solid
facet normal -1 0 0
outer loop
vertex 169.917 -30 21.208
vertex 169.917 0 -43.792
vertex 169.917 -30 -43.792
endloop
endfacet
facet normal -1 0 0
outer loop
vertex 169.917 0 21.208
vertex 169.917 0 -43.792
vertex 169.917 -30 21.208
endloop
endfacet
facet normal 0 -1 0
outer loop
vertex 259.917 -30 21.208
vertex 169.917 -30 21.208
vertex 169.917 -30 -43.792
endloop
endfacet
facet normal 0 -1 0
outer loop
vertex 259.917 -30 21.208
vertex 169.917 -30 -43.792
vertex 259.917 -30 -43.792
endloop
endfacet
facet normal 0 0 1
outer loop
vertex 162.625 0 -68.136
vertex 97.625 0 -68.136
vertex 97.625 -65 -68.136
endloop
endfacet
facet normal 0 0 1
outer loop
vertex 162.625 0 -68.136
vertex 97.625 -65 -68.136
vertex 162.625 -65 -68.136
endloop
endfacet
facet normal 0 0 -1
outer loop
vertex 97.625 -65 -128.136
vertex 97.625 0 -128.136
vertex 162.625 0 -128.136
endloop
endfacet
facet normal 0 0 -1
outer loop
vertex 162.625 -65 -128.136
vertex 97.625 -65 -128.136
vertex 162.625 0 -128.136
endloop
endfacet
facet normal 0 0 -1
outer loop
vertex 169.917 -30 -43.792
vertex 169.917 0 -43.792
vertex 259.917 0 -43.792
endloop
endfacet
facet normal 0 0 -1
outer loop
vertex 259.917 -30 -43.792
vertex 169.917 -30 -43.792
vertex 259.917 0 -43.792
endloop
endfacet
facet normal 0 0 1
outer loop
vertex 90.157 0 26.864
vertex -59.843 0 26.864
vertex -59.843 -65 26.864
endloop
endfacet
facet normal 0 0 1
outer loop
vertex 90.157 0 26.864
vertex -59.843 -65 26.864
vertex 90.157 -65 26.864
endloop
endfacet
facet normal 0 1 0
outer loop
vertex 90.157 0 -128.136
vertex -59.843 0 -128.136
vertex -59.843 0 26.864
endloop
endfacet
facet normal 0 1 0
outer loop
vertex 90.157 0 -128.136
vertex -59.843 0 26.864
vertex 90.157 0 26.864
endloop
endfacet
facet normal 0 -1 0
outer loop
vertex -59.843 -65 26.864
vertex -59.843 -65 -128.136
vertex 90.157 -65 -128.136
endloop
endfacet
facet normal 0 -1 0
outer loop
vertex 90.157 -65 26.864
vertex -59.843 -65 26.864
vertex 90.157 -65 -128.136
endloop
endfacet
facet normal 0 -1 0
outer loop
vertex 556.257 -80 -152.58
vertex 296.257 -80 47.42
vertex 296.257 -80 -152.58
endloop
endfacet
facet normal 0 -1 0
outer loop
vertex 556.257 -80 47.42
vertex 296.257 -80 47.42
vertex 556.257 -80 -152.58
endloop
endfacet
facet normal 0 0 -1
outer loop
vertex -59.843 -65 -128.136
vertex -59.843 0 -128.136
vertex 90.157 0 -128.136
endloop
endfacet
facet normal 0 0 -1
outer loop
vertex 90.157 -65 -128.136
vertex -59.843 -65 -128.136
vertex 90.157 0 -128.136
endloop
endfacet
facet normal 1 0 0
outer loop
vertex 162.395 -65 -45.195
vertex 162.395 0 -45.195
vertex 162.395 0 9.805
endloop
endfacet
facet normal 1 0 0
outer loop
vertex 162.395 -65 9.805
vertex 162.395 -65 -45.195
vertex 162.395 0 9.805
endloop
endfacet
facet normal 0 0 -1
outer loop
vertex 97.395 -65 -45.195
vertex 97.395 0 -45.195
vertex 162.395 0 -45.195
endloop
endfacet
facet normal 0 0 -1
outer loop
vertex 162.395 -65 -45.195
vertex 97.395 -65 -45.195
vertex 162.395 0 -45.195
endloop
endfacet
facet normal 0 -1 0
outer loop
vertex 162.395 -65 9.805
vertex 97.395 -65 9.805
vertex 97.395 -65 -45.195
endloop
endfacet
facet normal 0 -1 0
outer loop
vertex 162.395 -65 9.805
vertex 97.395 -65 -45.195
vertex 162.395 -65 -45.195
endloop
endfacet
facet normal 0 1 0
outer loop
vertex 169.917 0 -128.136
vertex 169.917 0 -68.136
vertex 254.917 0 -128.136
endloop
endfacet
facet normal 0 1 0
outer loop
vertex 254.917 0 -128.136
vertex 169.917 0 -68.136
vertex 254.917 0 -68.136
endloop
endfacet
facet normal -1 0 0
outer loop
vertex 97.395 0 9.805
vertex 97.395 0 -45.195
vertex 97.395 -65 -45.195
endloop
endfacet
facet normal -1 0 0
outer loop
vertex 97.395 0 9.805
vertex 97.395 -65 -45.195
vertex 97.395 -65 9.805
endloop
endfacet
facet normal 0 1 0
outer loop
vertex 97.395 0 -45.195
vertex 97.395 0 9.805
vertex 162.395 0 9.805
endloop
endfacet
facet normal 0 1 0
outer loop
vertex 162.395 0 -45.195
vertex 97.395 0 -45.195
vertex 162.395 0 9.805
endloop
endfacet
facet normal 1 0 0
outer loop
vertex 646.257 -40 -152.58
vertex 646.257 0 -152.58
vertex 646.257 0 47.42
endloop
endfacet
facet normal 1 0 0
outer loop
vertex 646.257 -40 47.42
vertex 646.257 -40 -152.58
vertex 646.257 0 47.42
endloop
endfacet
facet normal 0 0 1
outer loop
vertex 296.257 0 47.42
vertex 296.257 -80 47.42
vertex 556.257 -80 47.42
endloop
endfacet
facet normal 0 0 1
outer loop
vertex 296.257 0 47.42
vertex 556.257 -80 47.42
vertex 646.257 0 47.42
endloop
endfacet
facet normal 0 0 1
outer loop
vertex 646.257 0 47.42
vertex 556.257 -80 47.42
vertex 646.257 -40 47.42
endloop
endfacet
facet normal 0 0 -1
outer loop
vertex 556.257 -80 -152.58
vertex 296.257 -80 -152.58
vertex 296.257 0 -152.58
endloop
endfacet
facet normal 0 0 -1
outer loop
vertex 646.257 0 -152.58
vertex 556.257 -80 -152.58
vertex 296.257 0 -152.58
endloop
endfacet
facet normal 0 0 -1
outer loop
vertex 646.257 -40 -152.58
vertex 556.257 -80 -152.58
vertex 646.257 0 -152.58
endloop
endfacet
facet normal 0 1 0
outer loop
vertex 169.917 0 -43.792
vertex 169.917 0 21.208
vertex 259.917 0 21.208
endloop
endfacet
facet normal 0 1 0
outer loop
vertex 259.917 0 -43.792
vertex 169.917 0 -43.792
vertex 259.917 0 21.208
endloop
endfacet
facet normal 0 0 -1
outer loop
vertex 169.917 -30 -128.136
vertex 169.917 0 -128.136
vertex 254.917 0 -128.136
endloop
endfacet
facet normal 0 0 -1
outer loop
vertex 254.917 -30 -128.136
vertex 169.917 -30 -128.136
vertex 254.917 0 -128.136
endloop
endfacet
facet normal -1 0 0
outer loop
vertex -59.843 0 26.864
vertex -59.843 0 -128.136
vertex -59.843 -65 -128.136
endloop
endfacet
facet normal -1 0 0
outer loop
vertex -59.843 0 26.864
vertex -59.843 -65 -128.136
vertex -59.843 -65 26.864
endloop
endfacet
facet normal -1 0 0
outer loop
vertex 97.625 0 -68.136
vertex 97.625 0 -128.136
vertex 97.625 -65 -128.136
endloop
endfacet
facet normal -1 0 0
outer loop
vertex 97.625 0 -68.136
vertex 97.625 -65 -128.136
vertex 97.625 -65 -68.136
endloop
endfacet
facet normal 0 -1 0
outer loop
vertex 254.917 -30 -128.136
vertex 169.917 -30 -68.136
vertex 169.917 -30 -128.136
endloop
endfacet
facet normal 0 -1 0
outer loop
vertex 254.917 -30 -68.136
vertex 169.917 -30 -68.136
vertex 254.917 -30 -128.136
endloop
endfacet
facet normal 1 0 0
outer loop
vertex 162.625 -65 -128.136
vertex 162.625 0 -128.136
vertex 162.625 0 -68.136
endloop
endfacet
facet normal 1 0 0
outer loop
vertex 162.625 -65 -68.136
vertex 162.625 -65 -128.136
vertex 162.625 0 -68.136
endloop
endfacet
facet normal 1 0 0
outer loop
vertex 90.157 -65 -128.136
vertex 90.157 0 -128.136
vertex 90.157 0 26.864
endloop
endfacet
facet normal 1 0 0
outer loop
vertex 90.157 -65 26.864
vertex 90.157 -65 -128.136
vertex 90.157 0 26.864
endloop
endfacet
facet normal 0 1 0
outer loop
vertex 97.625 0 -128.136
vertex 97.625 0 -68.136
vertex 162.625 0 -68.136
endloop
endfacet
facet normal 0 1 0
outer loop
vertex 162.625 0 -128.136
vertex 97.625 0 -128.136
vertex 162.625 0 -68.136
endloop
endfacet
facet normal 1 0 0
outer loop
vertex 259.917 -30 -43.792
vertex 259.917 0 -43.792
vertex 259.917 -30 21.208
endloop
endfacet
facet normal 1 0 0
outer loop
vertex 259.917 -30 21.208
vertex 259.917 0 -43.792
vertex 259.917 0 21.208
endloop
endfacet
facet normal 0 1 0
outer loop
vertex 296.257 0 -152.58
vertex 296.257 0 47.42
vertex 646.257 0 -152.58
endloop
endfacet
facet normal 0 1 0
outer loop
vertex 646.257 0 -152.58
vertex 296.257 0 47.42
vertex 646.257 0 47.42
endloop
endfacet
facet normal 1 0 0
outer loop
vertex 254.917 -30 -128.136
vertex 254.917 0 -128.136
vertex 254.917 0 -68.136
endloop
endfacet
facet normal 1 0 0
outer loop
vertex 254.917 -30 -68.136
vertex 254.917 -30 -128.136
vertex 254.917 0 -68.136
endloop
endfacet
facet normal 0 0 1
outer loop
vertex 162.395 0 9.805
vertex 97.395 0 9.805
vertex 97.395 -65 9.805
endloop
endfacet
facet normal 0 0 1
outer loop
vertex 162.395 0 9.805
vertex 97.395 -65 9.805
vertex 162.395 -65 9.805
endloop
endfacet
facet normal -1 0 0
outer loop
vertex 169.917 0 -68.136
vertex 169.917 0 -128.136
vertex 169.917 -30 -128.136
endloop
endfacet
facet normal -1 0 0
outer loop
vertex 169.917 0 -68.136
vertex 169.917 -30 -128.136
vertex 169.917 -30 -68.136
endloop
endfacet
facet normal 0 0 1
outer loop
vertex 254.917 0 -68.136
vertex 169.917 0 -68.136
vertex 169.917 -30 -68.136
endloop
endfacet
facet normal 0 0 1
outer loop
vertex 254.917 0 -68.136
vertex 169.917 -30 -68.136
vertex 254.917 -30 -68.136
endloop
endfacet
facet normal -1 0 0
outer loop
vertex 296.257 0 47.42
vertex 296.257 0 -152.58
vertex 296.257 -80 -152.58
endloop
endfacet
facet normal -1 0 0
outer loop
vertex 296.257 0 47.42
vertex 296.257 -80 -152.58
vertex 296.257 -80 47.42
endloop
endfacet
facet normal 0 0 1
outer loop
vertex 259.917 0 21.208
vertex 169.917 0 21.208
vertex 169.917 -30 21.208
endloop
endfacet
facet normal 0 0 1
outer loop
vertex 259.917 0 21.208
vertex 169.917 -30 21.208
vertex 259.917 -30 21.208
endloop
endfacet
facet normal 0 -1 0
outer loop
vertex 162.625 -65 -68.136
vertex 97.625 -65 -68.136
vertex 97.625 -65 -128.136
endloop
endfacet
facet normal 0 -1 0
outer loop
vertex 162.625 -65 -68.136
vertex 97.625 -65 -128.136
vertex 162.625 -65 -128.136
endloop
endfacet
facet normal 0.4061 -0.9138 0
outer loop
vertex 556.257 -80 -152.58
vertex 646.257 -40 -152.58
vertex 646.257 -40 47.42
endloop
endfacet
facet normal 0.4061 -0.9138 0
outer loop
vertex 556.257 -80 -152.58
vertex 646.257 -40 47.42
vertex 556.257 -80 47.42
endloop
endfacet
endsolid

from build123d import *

# Parameters (mm, degrees)
F0_W     = 150
F0_H     = 155
F0_W_2   = 65
F0_H_2   = 60
F0_H_3   = 55
F1_DEPTH = 65
F0_W_3   = 260
F0_H_4   = 200
F2_DEPTH = 80
F0_W_4   = 90
F3_DEPTH = 40
F5_DEPTH = 200
F0_W_5   = 85
F0_H_5   = 65
F6_DEPTH = 30


with BuildPart() as f1:
    # F0 (on Front) → F1 (new body)
    with BuildSketch(Plane.XZ):
        with Locations((15.156873, -50.636422)):
            Rectangle(F0_W, F0_H)
        with Locations((130.12536, -98.136422)):
            Rectangle(F0_W_2, F0_H_2)
        with Locations((129.894735, -17.694888)):
            Rectangle(F0_W_2, F0_H_3)
    extrude(amount=F1_DEPTH)


with BuildPart() as f2:
    # F0 (on Front) → F2 (new body)
    with BuildSketch(Plane.XZ):
        with Locations((426.257008, -52.579842)):
            Rectangle(F0_W_3, F0_H_4)
    extrude(amount=F2_DEPTH)

    # F0 (on Front) → F3 (join)
    with BuildSketch(Plane.XZ):
        with Locations((601.257008, -52.579842)):
            Rectangle(F0_W_4, F0_H_4)
    extrude(amount=F3_DEPTH)

    # F4 (on face) → F5 (join)
    with BuildSketch(Plane(origin=(0, 0, -152.579842), x_dir=(1, 0, 0), z_dir=(0, 0, -1))):
        Polygon((646.257008, 40), (556.257008, 80), (556.257008, 40), align=None)
    extrude(amount=-F5_DEPTH)


with BuildPart() as f6:
    # F0 (on Front) → F6 (new body)
    with BuildSketch(Plane.XZ):
        with Locations((212.417495, -98.136422)):
            Rectangle(F0_W_5, F0_H_2)
        with Locations((214.917495, -11.29248)):
            Rectangle(F0_W_4, F0_H_5)
    extrude(amount=F6_DEPTH)


solid = Compound([f1.part, f2.part, f6.part])
